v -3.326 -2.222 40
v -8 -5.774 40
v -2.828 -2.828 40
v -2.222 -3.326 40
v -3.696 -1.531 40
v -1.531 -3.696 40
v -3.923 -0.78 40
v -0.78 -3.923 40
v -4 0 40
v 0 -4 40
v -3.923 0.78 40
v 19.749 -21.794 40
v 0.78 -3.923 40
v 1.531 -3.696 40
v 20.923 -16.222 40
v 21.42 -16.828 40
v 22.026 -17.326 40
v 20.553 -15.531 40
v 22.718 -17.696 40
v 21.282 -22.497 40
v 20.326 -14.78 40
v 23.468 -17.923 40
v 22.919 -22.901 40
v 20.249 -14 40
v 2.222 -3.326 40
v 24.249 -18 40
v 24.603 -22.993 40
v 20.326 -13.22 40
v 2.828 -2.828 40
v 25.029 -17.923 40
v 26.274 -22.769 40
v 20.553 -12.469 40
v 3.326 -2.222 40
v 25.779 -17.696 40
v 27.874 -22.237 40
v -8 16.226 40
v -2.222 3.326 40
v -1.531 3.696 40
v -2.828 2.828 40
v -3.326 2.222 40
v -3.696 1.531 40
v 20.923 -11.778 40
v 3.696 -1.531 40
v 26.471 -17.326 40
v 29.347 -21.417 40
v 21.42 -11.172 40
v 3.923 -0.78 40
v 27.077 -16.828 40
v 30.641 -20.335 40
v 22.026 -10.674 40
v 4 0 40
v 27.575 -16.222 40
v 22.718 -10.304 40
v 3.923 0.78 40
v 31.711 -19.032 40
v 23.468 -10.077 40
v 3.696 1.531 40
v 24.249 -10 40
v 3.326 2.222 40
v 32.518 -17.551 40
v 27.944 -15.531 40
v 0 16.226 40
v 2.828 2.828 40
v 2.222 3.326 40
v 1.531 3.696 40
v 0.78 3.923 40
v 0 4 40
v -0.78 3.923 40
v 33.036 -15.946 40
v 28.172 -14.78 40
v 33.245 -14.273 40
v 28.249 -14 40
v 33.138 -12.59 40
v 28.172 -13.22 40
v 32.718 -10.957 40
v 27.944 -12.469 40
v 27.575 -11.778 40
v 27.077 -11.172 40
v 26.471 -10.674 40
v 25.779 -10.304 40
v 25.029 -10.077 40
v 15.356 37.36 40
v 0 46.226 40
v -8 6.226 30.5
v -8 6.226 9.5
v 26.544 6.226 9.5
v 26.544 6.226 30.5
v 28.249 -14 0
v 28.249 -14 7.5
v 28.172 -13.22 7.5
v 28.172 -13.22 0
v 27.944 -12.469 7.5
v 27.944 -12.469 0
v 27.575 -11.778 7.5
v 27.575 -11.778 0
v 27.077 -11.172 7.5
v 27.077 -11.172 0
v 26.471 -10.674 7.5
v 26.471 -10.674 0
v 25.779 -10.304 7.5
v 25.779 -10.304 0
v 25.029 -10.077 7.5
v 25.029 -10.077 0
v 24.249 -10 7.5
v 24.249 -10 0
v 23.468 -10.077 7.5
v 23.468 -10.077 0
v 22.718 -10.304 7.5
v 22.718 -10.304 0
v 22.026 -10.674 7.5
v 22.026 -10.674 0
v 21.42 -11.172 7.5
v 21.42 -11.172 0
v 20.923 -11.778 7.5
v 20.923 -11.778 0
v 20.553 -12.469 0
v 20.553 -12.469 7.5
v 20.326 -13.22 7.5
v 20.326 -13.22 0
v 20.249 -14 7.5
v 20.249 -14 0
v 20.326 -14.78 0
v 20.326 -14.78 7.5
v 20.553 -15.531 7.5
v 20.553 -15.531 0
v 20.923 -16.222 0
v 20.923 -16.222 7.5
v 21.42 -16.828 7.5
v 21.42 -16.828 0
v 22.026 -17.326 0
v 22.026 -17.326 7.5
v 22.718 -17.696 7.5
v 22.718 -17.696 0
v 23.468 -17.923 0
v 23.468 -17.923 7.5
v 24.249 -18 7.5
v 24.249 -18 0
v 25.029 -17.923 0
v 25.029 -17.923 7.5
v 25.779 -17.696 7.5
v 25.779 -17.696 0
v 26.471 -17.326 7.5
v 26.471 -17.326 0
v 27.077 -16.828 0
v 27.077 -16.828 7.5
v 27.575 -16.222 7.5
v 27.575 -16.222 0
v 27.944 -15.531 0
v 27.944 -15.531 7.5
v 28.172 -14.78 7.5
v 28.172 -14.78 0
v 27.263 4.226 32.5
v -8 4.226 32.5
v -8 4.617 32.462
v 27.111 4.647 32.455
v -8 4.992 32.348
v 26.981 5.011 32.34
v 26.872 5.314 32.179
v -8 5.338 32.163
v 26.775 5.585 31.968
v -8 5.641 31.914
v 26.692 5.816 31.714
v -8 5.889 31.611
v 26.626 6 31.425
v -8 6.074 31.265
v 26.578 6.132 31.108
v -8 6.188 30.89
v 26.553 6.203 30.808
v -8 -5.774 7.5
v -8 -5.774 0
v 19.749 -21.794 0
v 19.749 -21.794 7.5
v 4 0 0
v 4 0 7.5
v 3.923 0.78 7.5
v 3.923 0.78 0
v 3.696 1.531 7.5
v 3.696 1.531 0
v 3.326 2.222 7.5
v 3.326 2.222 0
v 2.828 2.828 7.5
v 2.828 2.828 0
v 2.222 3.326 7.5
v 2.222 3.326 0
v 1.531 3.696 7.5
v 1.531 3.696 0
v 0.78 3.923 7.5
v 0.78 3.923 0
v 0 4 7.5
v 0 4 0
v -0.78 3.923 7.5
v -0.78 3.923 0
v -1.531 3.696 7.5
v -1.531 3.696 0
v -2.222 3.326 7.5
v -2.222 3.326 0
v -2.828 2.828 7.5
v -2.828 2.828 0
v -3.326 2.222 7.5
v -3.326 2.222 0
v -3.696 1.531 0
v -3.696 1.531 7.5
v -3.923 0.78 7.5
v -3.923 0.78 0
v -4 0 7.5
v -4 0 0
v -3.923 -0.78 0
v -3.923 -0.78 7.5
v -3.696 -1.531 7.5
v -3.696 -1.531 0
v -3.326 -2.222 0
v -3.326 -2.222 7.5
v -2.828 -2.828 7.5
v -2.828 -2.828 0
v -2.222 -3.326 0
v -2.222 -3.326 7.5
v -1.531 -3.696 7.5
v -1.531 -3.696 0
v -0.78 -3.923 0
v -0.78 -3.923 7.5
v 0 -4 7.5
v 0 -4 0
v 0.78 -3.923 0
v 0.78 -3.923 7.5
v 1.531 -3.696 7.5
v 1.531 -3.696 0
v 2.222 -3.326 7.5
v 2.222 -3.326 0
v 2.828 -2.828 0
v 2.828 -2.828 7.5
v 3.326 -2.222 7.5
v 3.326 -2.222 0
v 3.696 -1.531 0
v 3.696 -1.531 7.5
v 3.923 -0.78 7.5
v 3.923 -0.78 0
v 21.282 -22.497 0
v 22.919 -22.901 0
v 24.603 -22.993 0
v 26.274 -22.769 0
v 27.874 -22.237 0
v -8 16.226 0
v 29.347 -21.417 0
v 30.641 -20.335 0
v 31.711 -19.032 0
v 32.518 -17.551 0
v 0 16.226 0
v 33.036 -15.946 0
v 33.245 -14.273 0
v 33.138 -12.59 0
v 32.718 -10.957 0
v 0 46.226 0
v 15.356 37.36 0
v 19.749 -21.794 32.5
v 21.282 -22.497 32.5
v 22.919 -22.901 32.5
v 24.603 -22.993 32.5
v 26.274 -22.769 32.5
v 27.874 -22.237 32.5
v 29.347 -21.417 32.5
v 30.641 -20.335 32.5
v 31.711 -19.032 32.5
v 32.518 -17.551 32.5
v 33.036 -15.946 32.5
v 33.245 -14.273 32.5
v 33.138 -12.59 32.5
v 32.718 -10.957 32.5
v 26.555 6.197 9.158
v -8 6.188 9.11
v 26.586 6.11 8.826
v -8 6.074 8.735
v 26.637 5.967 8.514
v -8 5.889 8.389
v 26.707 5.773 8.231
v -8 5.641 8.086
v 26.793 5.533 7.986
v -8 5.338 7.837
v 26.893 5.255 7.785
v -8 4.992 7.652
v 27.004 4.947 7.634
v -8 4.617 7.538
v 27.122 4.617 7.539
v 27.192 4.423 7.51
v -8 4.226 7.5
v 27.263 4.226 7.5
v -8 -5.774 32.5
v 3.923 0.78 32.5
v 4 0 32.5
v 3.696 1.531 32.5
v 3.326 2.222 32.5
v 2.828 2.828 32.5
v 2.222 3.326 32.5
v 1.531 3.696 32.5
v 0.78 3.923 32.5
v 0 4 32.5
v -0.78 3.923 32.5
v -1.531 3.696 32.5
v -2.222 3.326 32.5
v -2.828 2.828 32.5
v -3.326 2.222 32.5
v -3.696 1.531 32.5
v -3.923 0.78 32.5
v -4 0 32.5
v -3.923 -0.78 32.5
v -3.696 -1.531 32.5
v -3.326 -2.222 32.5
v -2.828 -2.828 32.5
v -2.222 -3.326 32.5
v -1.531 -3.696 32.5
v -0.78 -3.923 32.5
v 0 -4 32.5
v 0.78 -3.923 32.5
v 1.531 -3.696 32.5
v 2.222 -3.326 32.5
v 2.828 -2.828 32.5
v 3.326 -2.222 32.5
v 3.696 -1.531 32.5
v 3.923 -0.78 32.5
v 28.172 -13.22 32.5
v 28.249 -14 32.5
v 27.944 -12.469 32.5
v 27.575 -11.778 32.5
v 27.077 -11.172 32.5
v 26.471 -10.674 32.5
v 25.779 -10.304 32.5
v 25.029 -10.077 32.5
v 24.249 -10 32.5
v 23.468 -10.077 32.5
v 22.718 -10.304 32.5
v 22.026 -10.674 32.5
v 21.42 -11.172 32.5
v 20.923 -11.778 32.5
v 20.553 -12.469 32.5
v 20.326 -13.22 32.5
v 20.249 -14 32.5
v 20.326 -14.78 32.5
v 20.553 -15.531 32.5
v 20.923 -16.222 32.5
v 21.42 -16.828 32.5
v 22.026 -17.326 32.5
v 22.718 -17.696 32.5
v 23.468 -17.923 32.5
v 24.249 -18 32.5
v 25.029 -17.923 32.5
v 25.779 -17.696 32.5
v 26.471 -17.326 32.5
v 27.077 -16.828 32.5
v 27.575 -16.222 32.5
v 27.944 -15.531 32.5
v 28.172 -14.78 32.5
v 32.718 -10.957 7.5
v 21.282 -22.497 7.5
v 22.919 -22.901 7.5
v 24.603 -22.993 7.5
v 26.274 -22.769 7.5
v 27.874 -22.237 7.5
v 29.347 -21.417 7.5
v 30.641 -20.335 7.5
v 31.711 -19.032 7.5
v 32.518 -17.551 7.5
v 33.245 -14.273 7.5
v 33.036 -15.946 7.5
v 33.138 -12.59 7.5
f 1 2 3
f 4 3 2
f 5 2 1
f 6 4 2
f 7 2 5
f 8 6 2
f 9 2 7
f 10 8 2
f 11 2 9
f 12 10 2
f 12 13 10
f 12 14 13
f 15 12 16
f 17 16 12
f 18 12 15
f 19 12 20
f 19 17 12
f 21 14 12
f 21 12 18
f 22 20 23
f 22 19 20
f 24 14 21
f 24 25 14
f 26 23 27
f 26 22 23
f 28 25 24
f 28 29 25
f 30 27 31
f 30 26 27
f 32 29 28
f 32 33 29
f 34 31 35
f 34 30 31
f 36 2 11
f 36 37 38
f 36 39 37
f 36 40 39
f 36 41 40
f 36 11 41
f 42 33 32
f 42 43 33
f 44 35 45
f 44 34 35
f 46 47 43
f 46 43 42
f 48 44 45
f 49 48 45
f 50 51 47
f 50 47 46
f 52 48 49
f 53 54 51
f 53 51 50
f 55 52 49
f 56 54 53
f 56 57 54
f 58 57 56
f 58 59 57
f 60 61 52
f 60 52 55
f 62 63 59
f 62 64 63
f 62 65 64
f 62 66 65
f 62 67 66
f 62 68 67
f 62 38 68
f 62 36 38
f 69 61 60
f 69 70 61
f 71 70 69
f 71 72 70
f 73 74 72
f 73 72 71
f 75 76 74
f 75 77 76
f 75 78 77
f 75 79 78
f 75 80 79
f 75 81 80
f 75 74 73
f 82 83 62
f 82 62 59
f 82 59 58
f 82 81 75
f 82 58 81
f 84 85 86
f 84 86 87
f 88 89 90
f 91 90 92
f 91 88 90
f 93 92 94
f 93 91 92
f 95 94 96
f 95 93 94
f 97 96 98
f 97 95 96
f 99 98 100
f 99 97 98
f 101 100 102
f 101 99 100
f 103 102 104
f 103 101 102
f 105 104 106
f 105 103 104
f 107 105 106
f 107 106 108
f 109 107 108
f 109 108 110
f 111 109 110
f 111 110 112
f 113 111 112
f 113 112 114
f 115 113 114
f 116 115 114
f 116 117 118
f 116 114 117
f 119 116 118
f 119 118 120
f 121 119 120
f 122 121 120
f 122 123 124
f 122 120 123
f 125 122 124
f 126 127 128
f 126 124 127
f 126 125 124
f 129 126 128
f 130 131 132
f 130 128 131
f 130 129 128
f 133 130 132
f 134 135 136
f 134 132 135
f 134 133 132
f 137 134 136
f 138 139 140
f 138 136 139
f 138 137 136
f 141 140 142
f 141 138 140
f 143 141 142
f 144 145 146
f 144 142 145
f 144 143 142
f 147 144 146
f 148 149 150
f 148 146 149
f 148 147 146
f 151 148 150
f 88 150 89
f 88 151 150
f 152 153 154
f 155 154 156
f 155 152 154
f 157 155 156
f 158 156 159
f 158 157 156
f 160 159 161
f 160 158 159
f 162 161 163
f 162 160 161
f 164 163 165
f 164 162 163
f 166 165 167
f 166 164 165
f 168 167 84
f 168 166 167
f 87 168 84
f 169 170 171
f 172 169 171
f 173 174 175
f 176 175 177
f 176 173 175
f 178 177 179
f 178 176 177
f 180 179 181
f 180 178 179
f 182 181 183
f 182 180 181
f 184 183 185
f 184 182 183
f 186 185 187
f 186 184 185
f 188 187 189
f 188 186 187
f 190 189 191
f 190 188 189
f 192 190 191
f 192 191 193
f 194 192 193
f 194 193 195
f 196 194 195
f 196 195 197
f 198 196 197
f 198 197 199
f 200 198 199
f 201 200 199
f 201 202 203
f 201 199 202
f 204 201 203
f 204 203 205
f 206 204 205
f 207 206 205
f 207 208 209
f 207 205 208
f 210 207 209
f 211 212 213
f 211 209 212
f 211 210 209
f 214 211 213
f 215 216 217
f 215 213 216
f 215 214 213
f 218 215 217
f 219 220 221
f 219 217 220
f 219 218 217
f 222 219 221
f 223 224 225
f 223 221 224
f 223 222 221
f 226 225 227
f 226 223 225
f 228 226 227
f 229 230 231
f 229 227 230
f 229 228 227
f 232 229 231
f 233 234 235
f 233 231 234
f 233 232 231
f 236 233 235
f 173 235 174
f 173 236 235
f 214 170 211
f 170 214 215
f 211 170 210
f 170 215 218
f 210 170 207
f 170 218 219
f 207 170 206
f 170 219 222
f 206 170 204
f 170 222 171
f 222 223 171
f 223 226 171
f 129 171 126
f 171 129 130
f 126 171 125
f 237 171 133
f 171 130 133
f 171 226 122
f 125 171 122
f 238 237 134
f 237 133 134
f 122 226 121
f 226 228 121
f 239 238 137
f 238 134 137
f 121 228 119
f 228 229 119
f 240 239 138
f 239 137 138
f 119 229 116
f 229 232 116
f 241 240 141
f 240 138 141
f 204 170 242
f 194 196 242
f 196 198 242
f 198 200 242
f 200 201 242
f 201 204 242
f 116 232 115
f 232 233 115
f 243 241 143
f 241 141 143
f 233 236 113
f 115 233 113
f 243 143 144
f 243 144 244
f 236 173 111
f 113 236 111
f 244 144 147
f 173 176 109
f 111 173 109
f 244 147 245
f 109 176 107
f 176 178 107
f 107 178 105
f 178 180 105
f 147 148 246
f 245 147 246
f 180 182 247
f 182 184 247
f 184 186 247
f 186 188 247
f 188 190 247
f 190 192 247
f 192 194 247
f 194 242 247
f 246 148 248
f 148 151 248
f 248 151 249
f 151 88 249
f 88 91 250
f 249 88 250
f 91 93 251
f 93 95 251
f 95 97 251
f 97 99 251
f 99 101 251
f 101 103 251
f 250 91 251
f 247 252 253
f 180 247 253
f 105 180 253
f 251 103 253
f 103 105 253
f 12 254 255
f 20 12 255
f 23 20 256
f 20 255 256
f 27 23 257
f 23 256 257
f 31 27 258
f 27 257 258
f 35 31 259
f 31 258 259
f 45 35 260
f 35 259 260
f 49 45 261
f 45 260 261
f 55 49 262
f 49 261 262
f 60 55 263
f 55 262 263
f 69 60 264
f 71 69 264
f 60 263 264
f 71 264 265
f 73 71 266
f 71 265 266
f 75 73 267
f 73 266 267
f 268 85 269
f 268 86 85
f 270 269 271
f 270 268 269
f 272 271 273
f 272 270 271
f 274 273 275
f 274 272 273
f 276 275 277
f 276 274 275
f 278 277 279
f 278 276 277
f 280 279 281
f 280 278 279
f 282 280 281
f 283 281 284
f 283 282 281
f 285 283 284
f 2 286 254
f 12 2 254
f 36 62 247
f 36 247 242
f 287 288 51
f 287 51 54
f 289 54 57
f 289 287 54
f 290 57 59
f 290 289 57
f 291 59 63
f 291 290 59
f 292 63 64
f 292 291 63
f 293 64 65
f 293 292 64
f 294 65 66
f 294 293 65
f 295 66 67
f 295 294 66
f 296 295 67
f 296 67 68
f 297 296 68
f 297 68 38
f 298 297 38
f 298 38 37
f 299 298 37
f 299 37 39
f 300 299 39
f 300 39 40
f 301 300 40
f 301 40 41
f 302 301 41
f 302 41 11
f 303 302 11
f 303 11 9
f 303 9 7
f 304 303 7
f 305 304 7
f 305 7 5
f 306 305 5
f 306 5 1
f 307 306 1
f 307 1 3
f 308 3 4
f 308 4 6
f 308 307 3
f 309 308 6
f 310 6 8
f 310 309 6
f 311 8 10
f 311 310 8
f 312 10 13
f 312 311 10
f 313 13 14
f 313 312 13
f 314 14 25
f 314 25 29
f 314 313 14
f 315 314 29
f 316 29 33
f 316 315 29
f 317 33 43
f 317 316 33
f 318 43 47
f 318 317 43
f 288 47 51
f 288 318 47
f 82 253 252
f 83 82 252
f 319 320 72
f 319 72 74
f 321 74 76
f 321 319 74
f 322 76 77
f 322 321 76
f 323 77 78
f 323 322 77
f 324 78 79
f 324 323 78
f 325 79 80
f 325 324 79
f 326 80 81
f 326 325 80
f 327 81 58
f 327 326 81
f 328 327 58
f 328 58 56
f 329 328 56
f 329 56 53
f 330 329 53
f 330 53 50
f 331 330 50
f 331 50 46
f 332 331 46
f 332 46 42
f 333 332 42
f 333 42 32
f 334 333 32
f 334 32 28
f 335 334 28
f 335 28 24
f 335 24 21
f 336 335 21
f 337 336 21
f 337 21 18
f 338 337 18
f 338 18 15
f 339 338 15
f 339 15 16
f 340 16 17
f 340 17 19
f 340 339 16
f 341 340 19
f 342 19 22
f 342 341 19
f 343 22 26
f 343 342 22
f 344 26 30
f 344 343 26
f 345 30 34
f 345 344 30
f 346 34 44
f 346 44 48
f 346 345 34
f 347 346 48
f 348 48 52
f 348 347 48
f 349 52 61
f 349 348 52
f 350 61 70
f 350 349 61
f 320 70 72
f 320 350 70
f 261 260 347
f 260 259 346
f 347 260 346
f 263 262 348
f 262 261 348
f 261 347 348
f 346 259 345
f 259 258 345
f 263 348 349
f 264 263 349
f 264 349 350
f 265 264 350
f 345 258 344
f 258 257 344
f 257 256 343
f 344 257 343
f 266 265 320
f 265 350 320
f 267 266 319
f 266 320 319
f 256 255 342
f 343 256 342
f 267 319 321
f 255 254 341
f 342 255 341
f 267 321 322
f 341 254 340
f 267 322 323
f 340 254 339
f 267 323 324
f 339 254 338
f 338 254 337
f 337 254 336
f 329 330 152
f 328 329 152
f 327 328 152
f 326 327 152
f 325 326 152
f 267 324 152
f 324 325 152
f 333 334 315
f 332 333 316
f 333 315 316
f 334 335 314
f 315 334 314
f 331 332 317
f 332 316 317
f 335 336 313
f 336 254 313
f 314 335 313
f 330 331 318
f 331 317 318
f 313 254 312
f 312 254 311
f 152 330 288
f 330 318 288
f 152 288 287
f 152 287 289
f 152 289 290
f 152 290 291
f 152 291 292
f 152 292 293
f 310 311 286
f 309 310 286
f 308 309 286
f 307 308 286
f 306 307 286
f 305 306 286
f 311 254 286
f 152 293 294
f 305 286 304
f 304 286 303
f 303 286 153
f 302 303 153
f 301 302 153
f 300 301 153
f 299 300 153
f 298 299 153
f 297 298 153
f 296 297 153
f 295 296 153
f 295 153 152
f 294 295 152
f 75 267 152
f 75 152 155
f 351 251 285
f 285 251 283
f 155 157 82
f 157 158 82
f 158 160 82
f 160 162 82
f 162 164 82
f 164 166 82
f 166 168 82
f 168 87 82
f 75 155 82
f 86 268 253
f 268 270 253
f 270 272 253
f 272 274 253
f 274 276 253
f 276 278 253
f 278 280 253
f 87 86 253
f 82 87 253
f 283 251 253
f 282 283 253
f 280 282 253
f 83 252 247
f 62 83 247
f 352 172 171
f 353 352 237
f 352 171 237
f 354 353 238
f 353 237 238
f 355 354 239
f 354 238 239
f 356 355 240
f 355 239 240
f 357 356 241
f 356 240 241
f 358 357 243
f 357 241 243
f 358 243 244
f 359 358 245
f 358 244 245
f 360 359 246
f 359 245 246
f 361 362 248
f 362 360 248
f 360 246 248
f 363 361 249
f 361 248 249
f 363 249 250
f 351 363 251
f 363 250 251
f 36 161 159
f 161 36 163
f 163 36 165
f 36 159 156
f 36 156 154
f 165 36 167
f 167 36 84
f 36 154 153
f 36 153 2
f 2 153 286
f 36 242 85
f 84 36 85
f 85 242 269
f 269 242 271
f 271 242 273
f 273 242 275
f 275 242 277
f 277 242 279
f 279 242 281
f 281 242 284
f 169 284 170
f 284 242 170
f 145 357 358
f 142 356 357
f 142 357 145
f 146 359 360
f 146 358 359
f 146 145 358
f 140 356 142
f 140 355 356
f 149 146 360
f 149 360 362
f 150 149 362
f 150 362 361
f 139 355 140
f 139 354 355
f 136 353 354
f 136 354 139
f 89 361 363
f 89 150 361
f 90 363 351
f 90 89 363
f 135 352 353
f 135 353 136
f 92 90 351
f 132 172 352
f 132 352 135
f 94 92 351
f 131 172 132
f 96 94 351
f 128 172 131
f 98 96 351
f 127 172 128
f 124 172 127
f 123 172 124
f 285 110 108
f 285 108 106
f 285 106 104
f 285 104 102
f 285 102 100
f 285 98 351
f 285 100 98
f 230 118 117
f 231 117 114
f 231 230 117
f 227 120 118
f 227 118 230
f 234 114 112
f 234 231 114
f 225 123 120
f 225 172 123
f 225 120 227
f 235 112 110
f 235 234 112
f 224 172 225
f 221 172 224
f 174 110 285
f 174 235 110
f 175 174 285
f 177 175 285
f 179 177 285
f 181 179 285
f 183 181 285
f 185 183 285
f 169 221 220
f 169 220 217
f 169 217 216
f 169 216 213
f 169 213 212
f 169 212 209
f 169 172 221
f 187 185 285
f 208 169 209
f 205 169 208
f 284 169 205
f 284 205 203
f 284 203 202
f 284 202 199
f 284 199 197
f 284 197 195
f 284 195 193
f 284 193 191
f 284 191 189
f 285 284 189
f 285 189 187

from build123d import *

# Parameters (mm, degrees)
SKETCH_1_R          = 4
EXTRUDE_1_DEPTH     = 40
SKETCH_2_W          = 25
SKETCH_2_H          = 31.038795999
CUT_EXTRUDE_1_DEPTH = 74.745137045
FILLET_3_R          = 2


with BuildPart() as part:
    # 草图1 → 凸台-拉伸1 (new body)
    with BuildSketch(Plane.XY):
        with BuildLine():
            Line((0, 46.226497308), (0, 16.226497308))
            Line((0, 16.226497308), (-8, 16.226497308))
            Line((-8, 16.226497308), (-8, -5.773502692))
            Line((-8, -5.773502692), (19.748711306, -21.794228634))
            ThreePointArc((19.748711306, -21.794228634), (30.019659504, -20.906240432), (32.718489579, -10.956505956))
            Line((32.718489579, -10.956505956), (15.356489888, 37.360423737))
            Line((15.356489888, 37.360423737), (0, 46.226497308))
        make_face()
        Circle(SKETCH_1_R, mode=Mode.SUBTRACT)
        with Locations((24.248711306, -14)):
            Circle(SKETCH_1_R, mode=Mode.SUBTRACT)
    extrude(amount=EXTRUDE_1_DEPTH)

    # 草图2 → 切除-拉伸1 (cut, through all)
    with BuildSketch(Plane.ZY.offset(8)):
        with Locations((20, -9.292900692)):
            Rectangle(SKETCH_2_W, SKETCH_2_H)
    extrude(amount=-CUT_EXTRUDE_1_DEPTH, mode=Mode.SUBTRACT)

    # 圆角3
    fillet_3_edges = [part.edges().sort_by_distance(p)[0] for p in [
        (9.272011192, 6.226497308, 7.5),
        (9.272011192, 6.226497308, 32.5),
    ]]
    fillet(fillet_3_edges, radius=FILLET_3_R)


solid = part.part
